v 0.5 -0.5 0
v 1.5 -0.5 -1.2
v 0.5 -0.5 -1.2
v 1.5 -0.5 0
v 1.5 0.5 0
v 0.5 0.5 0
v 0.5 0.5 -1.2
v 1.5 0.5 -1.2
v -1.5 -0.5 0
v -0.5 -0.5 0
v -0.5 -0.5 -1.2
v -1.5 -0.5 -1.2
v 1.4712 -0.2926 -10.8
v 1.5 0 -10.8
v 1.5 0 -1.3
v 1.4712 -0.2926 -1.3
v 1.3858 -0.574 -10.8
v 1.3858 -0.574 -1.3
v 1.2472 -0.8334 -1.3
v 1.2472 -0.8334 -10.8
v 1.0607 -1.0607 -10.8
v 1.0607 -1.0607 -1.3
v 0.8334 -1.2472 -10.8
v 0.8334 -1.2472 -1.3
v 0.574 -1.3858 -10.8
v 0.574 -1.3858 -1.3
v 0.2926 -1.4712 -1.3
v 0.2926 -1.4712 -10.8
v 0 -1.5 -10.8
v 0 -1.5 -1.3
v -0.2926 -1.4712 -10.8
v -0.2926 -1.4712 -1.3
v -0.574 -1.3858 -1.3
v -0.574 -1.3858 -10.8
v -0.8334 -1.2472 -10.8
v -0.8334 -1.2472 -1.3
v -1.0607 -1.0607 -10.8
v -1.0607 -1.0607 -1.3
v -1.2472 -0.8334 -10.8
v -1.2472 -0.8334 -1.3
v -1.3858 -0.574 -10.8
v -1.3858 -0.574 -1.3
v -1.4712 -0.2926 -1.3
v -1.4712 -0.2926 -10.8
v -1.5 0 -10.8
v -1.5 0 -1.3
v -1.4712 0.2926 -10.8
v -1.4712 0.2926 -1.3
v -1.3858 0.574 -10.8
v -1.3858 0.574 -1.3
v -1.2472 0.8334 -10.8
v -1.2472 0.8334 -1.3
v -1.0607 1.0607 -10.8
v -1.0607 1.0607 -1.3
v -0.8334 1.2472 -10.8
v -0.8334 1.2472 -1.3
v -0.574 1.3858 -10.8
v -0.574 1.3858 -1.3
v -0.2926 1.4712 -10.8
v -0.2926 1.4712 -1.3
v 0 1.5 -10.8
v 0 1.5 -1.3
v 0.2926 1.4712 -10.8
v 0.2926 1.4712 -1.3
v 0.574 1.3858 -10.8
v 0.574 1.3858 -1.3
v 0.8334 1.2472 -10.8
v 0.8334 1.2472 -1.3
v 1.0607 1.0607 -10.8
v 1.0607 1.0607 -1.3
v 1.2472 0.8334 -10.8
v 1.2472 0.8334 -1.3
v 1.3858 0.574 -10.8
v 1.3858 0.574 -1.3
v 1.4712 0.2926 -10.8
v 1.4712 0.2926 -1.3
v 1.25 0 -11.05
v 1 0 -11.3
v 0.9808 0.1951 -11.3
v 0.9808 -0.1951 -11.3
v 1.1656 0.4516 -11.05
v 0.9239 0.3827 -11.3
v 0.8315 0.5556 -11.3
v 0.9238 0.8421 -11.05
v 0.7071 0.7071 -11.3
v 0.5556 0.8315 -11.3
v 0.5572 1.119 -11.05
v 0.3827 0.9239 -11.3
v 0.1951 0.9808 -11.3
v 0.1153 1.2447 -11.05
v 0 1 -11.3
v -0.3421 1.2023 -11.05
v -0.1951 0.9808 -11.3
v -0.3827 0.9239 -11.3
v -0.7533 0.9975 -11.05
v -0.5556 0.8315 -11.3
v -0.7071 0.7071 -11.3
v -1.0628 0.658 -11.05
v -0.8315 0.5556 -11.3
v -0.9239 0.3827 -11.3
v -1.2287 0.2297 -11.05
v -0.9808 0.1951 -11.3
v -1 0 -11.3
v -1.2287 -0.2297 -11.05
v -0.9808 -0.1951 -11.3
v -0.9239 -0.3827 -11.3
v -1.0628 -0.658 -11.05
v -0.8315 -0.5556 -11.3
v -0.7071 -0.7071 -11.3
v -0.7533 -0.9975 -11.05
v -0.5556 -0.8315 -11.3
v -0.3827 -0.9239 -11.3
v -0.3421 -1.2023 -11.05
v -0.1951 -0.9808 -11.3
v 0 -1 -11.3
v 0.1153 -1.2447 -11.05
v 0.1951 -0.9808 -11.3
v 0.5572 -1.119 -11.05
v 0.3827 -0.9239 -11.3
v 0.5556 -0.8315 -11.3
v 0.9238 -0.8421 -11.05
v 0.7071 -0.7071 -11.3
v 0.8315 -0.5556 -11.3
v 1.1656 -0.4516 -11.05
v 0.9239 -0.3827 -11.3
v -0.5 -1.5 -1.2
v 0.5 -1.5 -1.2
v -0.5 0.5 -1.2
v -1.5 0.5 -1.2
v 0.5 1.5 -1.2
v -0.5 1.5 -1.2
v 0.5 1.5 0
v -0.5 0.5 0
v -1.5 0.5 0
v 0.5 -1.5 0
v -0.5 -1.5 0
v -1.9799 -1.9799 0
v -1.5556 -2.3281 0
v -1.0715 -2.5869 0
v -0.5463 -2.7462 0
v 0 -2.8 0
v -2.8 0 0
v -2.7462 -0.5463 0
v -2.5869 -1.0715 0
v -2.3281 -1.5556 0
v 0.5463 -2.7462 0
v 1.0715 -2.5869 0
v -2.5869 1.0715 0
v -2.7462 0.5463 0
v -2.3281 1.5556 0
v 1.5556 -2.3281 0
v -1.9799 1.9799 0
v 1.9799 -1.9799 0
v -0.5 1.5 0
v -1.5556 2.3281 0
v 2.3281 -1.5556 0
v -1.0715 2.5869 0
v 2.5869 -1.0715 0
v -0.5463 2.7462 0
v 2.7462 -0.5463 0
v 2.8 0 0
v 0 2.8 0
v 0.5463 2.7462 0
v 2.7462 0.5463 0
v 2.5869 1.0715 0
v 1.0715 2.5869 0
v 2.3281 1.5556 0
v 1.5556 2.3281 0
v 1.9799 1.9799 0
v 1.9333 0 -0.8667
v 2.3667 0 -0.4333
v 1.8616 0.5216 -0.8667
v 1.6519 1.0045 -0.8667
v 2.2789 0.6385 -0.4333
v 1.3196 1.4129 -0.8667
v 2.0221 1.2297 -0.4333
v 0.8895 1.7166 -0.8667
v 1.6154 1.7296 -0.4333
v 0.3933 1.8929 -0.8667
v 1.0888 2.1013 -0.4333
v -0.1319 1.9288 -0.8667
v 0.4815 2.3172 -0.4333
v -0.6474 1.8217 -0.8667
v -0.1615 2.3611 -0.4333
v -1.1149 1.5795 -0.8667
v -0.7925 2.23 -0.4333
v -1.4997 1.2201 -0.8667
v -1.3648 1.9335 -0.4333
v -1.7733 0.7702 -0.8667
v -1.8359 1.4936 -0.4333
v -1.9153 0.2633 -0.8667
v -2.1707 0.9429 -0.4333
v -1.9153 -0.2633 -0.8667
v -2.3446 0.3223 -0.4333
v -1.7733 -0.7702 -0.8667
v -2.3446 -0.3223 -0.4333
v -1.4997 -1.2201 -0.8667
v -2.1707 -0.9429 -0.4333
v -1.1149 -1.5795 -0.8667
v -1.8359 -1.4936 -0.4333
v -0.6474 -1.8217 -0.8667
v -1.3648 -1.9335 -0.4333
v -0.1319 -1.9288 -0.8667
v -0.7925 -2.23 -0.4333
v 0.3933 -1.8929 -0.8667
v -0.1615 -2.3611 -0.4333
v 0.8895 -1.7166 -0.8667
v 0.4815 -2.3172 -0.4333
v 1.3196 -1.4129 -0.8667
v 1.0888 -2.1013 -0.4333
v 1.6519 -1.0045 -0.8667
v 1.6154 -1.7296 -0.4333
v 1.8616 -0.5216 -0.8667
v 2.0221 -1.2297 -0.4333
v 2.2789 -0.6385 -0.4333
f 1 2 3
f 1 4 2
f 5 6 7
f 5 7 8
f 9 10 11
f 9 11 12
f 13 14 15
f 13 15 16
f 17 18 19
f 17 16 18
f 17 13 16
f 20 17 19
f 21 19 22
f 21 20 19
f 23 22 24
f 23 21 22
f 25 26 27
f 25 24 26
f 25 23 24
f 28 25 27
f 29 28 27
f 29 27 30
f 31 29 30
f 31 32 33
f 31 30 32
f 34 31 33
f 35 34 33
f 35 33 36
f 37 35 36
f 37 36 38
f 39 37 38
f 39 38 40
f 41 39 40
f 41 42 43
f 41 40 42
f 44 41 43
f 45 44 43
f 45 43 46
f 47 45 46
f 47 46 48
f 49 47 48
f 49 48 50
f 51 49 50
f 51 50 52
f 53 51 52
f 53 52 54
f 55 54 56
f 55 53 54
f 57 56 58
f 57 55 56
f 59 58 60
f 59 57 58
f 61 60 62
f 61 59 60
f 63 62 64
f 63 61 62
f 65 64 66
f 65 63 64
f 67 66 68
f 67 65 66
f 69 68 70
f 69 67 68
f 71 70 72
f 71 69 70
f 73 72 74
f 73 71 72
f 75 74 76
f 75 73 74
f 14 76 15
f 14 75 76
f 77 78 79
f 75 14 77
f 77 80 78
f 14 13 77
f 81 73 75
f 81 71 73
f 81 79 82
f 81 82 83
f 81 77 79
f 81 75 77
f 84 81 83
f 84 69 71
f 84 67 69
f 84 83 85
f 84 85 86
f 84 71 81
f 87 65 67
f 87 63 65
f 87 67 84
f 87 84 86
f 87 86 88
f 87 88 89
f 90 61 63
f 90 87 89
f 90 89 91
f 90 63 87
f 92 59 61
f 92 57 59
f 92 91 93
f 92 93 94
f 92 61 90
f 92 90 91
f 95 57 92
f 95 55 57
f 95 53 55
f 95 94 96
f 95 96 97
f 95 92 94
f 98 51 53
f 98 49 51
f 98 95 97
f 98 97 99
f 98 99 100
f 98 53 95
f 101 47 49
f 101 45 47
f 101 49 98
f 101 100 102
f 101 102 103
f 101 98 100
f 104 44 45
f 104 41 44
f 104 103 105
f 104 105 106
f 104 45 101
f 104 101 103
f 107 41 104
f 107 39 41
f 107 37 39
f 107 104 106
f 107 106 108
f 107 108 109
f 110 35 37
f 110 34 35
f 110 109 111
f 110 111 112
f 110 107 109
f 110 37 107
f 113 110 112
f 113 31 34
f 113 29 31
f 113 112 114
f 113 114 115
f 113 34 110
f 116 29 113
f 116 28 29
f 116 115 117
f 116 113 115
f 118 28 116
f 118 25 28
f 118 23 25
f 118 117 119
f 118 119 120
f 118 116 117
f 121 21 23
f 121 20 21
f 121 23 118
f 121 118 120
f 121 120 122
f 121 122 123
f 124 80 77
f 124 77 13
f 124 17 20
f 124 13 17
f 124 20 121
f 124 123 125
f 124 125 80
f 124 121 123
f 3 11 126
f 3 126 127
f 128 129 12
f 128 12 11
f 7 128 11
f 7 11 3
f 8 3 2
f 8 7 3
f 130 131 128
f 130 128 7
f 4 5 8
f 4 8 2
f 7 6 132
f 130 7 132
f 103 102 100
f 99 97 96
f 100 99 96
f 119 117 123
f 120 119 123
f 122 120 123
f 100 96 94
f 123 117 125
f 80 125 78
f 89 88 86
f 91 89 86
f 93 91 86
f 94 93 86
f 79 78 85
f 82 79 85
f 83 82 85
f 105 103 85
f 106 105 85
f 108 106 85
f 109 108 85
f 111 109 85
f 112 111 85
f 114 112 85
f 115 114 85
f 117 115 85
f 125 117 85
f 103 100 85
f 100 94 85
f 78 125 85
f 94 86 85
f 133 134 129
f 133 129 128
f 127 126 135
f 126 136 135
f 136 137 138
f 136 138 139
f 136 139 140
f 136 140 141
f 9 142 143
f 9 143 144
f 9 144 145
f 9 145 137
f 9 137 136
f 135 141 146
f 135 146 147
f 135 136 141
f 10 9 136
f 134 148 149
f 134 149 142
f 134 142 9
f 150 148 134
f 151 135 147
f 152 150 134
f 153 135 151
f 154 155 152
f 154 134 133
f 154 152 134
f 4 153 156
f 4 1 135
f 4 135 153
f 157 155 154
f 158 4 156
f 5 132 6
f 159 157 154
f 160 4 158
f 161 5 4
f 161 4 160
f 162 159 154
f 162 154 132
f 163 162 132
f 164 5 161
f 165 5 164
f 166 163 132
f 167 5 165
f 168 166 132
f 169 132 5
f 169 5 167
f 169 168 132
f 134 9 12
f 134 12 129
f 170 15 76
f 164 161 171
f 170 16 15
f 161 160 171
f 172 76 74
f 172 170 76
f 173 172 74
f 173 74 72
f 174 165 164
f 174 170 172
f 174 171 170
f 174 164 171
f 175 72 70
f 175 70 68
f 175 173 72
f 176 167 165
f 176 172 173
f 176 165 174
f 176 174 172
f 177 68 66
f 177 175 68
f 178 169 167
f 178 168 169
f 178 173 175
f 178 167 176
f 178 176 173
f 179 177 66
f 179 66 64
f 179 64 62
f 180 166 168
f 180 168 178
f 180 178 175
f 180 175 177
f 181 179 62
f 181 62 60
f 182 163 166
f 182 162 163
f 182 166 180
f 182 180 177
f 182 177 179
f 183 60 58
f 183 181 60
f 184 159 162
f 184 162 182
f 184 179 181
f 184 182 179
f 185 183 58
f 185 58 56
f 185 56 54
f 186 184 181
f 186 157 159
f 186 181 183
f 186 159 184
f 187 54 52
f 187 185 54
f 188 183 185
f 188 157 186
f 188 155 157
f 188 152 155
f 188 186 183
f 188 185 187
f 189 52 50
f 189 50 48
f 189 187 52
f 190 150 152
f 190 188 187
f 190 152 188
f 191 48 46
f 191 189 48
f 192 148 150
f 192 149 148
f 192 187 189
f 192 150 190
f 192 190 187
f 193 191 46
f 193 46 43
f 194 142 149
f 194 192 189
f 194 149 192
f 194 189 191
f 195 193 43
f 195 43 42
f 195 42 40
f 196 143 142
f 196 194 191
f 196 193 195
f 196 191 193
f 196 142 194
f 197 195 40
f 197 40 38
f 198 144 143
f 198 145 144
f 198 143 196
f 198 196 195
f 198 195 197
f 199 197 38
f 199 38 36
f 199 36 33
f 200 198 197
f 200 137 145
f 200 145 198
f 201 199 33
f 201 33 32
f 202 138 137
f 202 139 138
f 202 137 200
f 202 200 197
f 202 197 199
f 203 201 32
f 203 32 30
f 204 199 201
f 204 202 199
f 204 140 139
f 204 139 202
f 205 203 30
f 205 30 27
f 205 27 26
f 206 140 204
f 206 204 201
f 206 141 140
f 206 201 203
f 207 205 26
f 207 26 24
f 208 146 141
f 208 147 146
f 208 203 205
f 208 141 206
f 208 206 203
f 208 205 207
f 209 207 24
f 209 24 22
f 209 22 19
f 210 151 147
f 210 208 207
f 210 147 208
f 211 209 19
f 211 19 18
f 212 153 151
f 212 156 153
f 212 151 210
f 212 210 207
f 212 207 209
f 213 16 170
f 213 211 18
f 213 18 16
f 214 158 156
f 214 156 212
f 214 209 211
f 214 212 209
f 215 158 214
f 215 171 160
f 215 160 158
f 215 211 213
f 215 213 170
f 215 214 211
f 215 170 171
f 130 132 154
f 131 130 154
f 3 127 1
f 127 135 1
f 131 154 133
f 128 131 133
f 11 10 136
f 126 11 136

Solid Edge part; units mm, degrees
sketch "Sketch1" plane through (0, 0, 0) normal (0, -1, 0) x (1, 0, 0)
  line L0 (0, 0) -> (2.8, 0)
  line L1 (2.8, 0) -> (1.5, -1.3)
  line L2 (1.5, -1.3) -> (1.5, -11.3)
  line L3 (1.5, -11.3) -> (0, -11.3)
  dimension "D1" = 10
revolve "RevolvedProtrusion1" add sketch "Sketch1" angle 360 about axis through (0, 0, -21.75) along (0, 0, 1)
chamfer "mounting_chamfer" distance 0.5 angle 45 1 edges at (-1.5, 0, -11.3)
sketch "Sketch2" plane through (0, 0, 0) normal (0, 0, 1) x (0, 1, 0)
  line L0 (0.5, -0.5) -> (1.5, -0.5)
  line L1 (1.5, -0.5) -> (1.5, 0.5)
  line L2 (1.5, 0.5) -> (0.5, 0.5)
  line L3 (0.5, 1.5) -> (0.5, 0.5)
  line L4 (-0.5, 1.5) -> (0.5, 1.5)
  line L5 (-0.5, 0.5) -> (-0.5, 1.5)
  line L6 (-0.5, 0.5) -> (-1.5, 0.5)
  line L7 (-1.5, 0.5) -> (-1.5, -0.5)
  line L8 (-1.5, -0.5) -> (-0.5, -0.5)
  line L9 (-0.5, -1.5) -> (-0.5, -0.5)
  line L10 (0.5, -1.5) -> (-0.5, -1.5)
  line L11 (0.5, -0.5) -> (0.5, -1.5)
  dimension "D1" = 3
  dimension "D2" = 1
extrude "plus_cutout" cut sketch "Sketch2" against normal blind 1.2
cosmetic_thread "Thread1" size "M3"
properties part number "STD-DIN965-M3x15" material "Stainless steel"
